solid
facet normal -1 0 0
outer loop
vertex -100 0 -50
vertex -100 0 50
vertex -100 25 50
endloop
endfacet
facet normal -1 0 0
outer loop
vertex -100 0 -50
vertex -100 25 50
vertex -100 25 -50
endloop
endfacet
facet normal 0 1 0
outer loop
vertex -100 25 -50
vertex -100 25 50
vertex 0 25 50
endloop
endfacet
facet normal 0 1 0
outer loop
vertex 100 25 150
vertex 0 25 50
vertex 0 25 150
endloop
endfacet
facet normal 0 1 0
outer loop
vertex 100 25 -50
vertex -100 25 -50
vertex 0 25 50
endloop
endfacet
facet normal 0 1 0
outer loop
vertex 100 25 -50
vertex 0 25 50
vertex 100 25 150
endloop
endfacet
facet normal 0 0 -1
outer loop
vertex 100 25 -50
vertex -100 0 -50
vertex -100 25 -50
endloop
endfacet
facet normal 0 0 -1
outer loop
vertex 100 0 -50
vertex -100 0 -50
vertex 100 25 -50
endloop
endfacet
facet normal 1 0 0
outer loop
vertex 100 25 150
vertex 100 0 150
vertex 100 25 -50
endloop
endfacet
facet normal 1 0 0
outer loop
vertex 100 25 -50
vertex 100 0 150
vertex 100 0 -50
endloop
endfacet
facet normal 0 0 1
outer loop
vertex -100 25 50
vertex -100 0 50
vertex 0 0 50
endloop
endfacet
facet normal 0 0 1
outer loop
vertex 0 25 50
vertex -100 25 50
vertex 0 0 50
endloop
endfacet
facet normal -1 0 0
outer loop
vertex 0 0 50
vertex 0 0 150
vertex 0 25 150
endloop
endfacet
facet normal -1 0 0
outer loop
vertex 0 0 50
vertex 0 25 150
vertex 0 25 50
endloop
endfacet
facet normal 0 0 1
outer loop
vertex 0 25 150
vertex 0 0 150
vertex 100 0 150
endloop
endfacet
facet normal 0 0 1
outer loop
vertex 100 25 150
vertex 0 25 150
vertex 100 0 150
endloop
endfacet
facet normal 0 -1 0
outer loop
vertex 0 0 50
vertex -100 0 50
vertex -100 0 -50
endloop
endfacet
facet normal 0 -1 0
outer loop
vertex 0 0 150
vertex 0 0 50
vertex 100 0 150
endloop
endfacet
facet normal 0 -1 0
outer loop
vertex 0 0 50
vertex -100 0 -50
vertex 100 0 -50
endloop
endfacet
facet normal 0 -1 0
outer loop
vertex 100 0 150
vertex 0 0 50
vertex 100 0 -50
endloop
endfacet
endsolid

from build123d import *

# Parameters (mm, degrees)
SKETCH1_W           = 100
SKETCH1_H           = 100
SKETCH1_W_2         = 200
BOSS_EXTRUDE1_DEPTH = 25


with BuildPart() as part:
    # Sketch1 → Boss-Extrude1 (new body)
    with BuildSketch(Plane(origin=(0, 0, 0), x_dir=(1, 0, 0), z_dir=(0, 1, 0))):
        with Locations((50, -100)):
            Rectangle(SKETCH1_W, SKETCH1_H)
        Rectangle(SKETCH1_W_2, SKETCH1_H)
    extrude(amount=BOSS_EXTRUDE1_DEPTH)


solid = part.part
